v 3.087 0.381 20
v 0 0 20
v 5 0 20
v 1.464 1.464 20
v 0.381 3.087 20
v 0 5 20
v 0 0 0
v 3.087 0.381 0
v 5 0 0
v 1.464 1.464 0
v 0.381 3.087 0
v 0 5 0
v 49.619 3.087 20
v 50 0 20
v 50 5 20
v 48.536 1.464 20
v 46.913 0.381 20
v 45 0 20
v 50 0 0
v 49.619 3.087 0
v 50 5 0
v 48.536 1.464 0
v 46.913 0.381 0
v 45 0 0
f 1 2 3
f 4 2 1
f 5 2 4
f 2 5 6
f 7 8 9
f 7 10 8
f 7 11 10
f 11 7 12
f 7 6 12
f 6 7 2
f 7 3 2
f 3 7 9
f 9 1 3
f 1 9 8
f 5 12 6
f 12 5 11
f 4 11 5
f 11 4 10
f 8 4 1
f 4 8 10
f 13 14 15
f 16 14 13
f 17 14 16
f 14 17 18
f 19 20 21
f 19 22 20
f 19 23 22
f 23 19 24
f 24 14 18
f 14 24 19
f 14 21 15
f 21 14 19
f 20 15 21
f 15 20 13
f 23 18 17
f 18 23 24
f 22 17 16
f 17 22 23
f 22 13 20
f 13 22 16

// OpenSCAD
// file: remove-edges.scad
module left_cylinder(height, radius) {
    translate([radius, radius, 0])
        cylinder(r=radius, h=height);
}

module left_remove_edge(height, radius) {
    difference() {
        cube([radius, radius, height]);
        left_cylinder(height=height, radius=radius);
    }
}

module right_remove_edge(length, height, radius) {
    translate([length, 0, 0]) {
        rotate(a=90, v=[0, 0, 1]) {
            left_remove_edge(height=height, radius=radius);
        }
    }
}

// origin is front left bottom of cube being altered
module remove_edges(length, height, radius) {
    left_remove_edge(height=height, radius=radius);
    right_remove_edge(length=length, height=height, radius=radius);
}
// main file
use <remove-edges.scad>

length = 50;
height = 20;
radius = 5;

remove_edges(
    length=length,
    height=height,
    radius=radius
);
